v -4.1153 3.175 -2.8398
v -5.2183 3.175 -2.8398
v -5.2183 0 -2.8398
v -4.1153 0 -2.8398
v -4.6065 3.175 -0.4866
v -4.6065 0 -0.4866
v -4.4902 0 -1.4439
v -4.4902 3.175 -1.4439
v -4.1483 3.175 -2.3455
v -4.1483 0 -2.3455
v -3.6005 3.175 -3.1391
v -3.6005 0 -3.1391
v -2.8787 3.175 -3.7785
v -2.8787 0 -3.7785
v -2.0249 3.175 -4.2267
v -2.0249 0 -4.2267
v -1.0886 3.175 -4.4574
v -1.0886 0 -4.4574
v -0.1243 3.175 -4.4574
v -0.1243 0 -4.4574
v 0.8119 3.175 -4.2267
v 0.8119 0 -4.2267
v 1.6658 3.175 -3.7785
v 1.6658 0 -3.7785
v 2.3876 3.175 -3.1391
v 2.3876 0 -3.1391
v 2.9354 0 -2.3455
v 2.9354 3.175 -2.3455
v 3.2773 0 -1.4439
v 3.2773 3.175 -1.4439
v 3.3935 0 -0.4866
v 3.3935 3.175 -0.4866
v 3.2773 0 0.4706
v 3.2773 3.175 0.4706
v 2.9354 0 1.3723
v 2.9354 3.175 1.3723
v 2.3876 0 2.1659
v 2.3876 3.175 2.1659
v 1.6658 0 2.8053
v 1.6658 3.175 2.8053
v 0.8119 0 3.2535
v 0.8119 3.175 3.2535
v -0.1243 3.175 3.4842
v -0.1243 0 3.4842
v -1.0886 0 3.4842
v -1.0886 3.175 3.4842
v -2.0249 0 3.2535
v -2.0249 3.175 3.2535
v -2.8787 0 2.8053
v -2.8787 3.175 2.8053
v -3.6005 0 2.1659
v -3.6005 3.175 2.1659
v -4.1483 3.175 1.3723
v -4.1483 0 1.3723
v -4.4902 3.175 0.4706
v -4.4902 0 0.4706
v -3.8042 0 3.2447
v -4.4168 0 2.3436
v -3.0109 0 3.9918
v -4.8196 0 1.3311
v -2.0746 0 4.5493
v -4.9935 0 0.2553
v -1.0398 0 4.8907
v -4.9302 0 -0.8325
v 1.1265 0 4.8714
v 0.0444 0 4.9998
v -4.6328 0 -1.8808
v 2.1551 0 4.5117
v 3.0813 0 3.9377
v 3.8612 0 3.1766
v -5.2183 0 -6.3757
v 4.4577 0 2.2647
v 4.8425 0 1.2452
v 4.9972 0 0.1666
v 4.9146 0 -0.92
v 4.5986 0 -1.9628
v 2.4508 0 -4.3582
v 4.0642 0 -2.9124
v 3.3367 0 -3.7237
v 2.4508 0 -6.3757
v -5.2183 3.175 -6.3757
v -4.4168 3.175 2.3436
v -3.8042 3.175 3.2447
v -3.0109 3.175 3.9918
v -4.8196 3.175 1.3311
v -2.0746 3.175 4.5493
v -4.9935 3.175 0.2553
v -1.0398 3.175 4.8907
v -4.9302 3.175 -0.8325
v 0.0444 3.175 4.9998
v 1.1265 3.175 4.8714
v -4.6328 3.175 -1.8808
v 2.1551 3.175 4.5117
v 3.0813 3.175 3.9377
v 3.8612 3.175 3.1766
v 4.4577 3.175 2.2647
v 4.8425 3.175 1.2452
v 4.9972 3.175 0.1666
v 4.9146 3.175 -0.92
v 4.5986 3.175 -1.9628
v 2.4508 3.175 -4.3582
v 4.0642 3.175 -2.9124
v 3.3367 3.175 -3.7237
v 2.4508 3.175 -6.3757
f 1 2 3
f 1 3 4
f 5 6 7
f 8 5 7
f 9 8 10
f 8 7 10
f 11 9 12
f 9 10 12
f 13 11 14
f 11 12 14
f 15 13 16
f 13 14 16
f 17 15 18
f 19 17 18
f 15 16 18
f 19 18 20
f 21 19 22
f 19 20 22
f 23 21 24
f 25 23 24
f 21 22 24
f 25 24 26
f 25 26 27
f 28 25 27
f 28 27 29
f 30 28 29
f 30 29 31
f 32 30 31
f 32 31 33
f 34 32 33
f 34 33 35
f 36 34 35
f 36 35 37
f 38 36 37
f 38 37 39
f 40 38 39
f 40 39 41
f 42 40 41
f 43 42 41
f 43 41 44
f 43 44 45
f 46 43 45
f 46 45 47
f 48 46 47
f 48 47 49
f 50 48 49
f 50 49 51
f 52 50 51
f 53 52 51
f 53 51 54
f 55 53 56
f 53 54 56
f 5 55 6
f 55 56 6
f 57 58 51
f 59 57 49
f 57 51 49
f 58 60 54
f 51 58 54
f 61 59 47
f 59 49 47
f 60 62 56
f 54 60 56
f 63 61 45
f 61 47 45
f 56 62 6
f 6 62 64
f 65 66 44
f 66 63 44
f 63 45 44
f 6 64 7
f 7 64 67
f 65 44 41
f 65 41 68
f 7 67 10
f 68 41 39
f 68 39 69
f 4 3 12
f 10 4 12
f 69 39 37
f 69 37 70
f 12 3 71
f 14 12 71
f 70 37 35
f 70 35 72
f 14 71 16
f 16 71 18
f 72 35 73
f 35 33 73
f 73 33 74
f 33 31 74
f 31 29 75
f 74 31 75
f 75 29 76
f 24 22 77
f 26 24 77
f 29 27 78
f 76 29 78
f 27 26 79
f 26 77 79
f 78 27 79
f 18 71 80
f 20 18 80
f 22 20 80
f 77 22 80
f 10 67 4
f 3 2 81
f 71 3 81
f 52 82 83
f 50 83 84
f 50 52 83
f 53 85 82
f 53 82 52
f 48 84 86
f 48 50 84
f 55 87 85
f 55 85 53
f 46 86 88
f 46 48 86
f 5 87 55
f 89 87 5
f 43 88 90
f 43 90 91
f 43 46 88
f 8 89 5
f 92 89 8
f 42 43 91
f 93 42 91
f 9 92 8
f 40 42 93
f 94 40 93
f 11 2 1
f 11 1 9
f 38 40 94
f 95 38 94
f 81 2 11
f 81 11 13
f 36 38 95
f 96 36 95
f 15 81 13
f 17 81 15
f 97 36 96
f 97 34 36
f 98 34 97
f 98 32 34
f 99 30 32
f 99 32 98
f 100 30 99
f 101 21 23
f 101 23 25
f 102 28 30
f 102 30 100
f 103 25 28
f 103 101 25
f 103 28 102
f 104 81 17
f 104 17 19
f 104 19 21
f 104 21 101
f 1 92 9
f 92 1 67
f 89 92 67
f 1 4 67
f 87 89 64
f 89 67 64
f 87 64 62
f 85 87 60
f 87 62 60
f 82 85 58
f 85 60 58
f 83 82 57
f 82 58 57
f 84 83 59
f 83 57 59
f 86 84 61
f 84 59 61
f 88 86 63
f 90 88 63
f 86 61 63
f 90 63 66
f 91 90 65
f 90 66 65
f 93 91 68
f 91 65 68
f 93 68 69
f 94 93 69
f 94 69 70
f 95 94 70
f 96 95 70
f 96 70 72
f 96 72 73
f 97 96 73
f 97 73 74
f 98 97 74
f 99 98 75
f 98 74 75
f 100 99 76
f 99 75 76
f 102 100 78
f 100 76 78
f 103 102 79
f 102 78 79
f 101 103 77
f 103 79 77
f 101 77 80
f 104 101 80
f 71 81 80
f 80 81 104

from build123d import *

# Parameters (mm, degrees)
SKETCH1_R                = 5
BOSS_EXTRUDE1_DEPTH      = 3.175
SKETCH2_W                = 7.669126603
SKETCH2_H                = 3.535914735
BOSS_EXTRUDE2_DEPTH      = 3.175
F_8_0_8_DIAMETER_HOLE1_D = 8


with BuildPart() as part:
    # Sketch1 → Boss-Extrude1 (new body)
    with BuildSketch(Plane(origin=(0, 0, 0), x_dir=(1, 0, 0), z_dir=(0, 1, 0))):
        Circle(SKETCH1_R)
    extrude(amount=BOSS_EXTRUDE1_DEPTH)

    # Sketch2 → Boss-Extrude2 (add)
    with BuildSketch(Plane(origin=(0, 3.175, 0), x_dir=(1, 0, 0), z_dir=(0, 1, 0))):
        with Locations((-1.383775104, 4.607725038)):
            Rectangle(SKETCH2_W, SKETCH2_H)
    extrude(amount=-BOSS_EXTRUDE2_DEPTH)

    # Ø8.0 (8) Diameter Hole1 (through all)
    with Locations(Plane(origin=(0, 3.175, 0), x_dir=(1, 0, 0), z_dir=(0, 1, 0))):
        with Locations((-0.606472724, 0.48661405)):
            Hole(F_8_0_8_DIAMETER_HOLE1_D / 2)


solid = part.part
